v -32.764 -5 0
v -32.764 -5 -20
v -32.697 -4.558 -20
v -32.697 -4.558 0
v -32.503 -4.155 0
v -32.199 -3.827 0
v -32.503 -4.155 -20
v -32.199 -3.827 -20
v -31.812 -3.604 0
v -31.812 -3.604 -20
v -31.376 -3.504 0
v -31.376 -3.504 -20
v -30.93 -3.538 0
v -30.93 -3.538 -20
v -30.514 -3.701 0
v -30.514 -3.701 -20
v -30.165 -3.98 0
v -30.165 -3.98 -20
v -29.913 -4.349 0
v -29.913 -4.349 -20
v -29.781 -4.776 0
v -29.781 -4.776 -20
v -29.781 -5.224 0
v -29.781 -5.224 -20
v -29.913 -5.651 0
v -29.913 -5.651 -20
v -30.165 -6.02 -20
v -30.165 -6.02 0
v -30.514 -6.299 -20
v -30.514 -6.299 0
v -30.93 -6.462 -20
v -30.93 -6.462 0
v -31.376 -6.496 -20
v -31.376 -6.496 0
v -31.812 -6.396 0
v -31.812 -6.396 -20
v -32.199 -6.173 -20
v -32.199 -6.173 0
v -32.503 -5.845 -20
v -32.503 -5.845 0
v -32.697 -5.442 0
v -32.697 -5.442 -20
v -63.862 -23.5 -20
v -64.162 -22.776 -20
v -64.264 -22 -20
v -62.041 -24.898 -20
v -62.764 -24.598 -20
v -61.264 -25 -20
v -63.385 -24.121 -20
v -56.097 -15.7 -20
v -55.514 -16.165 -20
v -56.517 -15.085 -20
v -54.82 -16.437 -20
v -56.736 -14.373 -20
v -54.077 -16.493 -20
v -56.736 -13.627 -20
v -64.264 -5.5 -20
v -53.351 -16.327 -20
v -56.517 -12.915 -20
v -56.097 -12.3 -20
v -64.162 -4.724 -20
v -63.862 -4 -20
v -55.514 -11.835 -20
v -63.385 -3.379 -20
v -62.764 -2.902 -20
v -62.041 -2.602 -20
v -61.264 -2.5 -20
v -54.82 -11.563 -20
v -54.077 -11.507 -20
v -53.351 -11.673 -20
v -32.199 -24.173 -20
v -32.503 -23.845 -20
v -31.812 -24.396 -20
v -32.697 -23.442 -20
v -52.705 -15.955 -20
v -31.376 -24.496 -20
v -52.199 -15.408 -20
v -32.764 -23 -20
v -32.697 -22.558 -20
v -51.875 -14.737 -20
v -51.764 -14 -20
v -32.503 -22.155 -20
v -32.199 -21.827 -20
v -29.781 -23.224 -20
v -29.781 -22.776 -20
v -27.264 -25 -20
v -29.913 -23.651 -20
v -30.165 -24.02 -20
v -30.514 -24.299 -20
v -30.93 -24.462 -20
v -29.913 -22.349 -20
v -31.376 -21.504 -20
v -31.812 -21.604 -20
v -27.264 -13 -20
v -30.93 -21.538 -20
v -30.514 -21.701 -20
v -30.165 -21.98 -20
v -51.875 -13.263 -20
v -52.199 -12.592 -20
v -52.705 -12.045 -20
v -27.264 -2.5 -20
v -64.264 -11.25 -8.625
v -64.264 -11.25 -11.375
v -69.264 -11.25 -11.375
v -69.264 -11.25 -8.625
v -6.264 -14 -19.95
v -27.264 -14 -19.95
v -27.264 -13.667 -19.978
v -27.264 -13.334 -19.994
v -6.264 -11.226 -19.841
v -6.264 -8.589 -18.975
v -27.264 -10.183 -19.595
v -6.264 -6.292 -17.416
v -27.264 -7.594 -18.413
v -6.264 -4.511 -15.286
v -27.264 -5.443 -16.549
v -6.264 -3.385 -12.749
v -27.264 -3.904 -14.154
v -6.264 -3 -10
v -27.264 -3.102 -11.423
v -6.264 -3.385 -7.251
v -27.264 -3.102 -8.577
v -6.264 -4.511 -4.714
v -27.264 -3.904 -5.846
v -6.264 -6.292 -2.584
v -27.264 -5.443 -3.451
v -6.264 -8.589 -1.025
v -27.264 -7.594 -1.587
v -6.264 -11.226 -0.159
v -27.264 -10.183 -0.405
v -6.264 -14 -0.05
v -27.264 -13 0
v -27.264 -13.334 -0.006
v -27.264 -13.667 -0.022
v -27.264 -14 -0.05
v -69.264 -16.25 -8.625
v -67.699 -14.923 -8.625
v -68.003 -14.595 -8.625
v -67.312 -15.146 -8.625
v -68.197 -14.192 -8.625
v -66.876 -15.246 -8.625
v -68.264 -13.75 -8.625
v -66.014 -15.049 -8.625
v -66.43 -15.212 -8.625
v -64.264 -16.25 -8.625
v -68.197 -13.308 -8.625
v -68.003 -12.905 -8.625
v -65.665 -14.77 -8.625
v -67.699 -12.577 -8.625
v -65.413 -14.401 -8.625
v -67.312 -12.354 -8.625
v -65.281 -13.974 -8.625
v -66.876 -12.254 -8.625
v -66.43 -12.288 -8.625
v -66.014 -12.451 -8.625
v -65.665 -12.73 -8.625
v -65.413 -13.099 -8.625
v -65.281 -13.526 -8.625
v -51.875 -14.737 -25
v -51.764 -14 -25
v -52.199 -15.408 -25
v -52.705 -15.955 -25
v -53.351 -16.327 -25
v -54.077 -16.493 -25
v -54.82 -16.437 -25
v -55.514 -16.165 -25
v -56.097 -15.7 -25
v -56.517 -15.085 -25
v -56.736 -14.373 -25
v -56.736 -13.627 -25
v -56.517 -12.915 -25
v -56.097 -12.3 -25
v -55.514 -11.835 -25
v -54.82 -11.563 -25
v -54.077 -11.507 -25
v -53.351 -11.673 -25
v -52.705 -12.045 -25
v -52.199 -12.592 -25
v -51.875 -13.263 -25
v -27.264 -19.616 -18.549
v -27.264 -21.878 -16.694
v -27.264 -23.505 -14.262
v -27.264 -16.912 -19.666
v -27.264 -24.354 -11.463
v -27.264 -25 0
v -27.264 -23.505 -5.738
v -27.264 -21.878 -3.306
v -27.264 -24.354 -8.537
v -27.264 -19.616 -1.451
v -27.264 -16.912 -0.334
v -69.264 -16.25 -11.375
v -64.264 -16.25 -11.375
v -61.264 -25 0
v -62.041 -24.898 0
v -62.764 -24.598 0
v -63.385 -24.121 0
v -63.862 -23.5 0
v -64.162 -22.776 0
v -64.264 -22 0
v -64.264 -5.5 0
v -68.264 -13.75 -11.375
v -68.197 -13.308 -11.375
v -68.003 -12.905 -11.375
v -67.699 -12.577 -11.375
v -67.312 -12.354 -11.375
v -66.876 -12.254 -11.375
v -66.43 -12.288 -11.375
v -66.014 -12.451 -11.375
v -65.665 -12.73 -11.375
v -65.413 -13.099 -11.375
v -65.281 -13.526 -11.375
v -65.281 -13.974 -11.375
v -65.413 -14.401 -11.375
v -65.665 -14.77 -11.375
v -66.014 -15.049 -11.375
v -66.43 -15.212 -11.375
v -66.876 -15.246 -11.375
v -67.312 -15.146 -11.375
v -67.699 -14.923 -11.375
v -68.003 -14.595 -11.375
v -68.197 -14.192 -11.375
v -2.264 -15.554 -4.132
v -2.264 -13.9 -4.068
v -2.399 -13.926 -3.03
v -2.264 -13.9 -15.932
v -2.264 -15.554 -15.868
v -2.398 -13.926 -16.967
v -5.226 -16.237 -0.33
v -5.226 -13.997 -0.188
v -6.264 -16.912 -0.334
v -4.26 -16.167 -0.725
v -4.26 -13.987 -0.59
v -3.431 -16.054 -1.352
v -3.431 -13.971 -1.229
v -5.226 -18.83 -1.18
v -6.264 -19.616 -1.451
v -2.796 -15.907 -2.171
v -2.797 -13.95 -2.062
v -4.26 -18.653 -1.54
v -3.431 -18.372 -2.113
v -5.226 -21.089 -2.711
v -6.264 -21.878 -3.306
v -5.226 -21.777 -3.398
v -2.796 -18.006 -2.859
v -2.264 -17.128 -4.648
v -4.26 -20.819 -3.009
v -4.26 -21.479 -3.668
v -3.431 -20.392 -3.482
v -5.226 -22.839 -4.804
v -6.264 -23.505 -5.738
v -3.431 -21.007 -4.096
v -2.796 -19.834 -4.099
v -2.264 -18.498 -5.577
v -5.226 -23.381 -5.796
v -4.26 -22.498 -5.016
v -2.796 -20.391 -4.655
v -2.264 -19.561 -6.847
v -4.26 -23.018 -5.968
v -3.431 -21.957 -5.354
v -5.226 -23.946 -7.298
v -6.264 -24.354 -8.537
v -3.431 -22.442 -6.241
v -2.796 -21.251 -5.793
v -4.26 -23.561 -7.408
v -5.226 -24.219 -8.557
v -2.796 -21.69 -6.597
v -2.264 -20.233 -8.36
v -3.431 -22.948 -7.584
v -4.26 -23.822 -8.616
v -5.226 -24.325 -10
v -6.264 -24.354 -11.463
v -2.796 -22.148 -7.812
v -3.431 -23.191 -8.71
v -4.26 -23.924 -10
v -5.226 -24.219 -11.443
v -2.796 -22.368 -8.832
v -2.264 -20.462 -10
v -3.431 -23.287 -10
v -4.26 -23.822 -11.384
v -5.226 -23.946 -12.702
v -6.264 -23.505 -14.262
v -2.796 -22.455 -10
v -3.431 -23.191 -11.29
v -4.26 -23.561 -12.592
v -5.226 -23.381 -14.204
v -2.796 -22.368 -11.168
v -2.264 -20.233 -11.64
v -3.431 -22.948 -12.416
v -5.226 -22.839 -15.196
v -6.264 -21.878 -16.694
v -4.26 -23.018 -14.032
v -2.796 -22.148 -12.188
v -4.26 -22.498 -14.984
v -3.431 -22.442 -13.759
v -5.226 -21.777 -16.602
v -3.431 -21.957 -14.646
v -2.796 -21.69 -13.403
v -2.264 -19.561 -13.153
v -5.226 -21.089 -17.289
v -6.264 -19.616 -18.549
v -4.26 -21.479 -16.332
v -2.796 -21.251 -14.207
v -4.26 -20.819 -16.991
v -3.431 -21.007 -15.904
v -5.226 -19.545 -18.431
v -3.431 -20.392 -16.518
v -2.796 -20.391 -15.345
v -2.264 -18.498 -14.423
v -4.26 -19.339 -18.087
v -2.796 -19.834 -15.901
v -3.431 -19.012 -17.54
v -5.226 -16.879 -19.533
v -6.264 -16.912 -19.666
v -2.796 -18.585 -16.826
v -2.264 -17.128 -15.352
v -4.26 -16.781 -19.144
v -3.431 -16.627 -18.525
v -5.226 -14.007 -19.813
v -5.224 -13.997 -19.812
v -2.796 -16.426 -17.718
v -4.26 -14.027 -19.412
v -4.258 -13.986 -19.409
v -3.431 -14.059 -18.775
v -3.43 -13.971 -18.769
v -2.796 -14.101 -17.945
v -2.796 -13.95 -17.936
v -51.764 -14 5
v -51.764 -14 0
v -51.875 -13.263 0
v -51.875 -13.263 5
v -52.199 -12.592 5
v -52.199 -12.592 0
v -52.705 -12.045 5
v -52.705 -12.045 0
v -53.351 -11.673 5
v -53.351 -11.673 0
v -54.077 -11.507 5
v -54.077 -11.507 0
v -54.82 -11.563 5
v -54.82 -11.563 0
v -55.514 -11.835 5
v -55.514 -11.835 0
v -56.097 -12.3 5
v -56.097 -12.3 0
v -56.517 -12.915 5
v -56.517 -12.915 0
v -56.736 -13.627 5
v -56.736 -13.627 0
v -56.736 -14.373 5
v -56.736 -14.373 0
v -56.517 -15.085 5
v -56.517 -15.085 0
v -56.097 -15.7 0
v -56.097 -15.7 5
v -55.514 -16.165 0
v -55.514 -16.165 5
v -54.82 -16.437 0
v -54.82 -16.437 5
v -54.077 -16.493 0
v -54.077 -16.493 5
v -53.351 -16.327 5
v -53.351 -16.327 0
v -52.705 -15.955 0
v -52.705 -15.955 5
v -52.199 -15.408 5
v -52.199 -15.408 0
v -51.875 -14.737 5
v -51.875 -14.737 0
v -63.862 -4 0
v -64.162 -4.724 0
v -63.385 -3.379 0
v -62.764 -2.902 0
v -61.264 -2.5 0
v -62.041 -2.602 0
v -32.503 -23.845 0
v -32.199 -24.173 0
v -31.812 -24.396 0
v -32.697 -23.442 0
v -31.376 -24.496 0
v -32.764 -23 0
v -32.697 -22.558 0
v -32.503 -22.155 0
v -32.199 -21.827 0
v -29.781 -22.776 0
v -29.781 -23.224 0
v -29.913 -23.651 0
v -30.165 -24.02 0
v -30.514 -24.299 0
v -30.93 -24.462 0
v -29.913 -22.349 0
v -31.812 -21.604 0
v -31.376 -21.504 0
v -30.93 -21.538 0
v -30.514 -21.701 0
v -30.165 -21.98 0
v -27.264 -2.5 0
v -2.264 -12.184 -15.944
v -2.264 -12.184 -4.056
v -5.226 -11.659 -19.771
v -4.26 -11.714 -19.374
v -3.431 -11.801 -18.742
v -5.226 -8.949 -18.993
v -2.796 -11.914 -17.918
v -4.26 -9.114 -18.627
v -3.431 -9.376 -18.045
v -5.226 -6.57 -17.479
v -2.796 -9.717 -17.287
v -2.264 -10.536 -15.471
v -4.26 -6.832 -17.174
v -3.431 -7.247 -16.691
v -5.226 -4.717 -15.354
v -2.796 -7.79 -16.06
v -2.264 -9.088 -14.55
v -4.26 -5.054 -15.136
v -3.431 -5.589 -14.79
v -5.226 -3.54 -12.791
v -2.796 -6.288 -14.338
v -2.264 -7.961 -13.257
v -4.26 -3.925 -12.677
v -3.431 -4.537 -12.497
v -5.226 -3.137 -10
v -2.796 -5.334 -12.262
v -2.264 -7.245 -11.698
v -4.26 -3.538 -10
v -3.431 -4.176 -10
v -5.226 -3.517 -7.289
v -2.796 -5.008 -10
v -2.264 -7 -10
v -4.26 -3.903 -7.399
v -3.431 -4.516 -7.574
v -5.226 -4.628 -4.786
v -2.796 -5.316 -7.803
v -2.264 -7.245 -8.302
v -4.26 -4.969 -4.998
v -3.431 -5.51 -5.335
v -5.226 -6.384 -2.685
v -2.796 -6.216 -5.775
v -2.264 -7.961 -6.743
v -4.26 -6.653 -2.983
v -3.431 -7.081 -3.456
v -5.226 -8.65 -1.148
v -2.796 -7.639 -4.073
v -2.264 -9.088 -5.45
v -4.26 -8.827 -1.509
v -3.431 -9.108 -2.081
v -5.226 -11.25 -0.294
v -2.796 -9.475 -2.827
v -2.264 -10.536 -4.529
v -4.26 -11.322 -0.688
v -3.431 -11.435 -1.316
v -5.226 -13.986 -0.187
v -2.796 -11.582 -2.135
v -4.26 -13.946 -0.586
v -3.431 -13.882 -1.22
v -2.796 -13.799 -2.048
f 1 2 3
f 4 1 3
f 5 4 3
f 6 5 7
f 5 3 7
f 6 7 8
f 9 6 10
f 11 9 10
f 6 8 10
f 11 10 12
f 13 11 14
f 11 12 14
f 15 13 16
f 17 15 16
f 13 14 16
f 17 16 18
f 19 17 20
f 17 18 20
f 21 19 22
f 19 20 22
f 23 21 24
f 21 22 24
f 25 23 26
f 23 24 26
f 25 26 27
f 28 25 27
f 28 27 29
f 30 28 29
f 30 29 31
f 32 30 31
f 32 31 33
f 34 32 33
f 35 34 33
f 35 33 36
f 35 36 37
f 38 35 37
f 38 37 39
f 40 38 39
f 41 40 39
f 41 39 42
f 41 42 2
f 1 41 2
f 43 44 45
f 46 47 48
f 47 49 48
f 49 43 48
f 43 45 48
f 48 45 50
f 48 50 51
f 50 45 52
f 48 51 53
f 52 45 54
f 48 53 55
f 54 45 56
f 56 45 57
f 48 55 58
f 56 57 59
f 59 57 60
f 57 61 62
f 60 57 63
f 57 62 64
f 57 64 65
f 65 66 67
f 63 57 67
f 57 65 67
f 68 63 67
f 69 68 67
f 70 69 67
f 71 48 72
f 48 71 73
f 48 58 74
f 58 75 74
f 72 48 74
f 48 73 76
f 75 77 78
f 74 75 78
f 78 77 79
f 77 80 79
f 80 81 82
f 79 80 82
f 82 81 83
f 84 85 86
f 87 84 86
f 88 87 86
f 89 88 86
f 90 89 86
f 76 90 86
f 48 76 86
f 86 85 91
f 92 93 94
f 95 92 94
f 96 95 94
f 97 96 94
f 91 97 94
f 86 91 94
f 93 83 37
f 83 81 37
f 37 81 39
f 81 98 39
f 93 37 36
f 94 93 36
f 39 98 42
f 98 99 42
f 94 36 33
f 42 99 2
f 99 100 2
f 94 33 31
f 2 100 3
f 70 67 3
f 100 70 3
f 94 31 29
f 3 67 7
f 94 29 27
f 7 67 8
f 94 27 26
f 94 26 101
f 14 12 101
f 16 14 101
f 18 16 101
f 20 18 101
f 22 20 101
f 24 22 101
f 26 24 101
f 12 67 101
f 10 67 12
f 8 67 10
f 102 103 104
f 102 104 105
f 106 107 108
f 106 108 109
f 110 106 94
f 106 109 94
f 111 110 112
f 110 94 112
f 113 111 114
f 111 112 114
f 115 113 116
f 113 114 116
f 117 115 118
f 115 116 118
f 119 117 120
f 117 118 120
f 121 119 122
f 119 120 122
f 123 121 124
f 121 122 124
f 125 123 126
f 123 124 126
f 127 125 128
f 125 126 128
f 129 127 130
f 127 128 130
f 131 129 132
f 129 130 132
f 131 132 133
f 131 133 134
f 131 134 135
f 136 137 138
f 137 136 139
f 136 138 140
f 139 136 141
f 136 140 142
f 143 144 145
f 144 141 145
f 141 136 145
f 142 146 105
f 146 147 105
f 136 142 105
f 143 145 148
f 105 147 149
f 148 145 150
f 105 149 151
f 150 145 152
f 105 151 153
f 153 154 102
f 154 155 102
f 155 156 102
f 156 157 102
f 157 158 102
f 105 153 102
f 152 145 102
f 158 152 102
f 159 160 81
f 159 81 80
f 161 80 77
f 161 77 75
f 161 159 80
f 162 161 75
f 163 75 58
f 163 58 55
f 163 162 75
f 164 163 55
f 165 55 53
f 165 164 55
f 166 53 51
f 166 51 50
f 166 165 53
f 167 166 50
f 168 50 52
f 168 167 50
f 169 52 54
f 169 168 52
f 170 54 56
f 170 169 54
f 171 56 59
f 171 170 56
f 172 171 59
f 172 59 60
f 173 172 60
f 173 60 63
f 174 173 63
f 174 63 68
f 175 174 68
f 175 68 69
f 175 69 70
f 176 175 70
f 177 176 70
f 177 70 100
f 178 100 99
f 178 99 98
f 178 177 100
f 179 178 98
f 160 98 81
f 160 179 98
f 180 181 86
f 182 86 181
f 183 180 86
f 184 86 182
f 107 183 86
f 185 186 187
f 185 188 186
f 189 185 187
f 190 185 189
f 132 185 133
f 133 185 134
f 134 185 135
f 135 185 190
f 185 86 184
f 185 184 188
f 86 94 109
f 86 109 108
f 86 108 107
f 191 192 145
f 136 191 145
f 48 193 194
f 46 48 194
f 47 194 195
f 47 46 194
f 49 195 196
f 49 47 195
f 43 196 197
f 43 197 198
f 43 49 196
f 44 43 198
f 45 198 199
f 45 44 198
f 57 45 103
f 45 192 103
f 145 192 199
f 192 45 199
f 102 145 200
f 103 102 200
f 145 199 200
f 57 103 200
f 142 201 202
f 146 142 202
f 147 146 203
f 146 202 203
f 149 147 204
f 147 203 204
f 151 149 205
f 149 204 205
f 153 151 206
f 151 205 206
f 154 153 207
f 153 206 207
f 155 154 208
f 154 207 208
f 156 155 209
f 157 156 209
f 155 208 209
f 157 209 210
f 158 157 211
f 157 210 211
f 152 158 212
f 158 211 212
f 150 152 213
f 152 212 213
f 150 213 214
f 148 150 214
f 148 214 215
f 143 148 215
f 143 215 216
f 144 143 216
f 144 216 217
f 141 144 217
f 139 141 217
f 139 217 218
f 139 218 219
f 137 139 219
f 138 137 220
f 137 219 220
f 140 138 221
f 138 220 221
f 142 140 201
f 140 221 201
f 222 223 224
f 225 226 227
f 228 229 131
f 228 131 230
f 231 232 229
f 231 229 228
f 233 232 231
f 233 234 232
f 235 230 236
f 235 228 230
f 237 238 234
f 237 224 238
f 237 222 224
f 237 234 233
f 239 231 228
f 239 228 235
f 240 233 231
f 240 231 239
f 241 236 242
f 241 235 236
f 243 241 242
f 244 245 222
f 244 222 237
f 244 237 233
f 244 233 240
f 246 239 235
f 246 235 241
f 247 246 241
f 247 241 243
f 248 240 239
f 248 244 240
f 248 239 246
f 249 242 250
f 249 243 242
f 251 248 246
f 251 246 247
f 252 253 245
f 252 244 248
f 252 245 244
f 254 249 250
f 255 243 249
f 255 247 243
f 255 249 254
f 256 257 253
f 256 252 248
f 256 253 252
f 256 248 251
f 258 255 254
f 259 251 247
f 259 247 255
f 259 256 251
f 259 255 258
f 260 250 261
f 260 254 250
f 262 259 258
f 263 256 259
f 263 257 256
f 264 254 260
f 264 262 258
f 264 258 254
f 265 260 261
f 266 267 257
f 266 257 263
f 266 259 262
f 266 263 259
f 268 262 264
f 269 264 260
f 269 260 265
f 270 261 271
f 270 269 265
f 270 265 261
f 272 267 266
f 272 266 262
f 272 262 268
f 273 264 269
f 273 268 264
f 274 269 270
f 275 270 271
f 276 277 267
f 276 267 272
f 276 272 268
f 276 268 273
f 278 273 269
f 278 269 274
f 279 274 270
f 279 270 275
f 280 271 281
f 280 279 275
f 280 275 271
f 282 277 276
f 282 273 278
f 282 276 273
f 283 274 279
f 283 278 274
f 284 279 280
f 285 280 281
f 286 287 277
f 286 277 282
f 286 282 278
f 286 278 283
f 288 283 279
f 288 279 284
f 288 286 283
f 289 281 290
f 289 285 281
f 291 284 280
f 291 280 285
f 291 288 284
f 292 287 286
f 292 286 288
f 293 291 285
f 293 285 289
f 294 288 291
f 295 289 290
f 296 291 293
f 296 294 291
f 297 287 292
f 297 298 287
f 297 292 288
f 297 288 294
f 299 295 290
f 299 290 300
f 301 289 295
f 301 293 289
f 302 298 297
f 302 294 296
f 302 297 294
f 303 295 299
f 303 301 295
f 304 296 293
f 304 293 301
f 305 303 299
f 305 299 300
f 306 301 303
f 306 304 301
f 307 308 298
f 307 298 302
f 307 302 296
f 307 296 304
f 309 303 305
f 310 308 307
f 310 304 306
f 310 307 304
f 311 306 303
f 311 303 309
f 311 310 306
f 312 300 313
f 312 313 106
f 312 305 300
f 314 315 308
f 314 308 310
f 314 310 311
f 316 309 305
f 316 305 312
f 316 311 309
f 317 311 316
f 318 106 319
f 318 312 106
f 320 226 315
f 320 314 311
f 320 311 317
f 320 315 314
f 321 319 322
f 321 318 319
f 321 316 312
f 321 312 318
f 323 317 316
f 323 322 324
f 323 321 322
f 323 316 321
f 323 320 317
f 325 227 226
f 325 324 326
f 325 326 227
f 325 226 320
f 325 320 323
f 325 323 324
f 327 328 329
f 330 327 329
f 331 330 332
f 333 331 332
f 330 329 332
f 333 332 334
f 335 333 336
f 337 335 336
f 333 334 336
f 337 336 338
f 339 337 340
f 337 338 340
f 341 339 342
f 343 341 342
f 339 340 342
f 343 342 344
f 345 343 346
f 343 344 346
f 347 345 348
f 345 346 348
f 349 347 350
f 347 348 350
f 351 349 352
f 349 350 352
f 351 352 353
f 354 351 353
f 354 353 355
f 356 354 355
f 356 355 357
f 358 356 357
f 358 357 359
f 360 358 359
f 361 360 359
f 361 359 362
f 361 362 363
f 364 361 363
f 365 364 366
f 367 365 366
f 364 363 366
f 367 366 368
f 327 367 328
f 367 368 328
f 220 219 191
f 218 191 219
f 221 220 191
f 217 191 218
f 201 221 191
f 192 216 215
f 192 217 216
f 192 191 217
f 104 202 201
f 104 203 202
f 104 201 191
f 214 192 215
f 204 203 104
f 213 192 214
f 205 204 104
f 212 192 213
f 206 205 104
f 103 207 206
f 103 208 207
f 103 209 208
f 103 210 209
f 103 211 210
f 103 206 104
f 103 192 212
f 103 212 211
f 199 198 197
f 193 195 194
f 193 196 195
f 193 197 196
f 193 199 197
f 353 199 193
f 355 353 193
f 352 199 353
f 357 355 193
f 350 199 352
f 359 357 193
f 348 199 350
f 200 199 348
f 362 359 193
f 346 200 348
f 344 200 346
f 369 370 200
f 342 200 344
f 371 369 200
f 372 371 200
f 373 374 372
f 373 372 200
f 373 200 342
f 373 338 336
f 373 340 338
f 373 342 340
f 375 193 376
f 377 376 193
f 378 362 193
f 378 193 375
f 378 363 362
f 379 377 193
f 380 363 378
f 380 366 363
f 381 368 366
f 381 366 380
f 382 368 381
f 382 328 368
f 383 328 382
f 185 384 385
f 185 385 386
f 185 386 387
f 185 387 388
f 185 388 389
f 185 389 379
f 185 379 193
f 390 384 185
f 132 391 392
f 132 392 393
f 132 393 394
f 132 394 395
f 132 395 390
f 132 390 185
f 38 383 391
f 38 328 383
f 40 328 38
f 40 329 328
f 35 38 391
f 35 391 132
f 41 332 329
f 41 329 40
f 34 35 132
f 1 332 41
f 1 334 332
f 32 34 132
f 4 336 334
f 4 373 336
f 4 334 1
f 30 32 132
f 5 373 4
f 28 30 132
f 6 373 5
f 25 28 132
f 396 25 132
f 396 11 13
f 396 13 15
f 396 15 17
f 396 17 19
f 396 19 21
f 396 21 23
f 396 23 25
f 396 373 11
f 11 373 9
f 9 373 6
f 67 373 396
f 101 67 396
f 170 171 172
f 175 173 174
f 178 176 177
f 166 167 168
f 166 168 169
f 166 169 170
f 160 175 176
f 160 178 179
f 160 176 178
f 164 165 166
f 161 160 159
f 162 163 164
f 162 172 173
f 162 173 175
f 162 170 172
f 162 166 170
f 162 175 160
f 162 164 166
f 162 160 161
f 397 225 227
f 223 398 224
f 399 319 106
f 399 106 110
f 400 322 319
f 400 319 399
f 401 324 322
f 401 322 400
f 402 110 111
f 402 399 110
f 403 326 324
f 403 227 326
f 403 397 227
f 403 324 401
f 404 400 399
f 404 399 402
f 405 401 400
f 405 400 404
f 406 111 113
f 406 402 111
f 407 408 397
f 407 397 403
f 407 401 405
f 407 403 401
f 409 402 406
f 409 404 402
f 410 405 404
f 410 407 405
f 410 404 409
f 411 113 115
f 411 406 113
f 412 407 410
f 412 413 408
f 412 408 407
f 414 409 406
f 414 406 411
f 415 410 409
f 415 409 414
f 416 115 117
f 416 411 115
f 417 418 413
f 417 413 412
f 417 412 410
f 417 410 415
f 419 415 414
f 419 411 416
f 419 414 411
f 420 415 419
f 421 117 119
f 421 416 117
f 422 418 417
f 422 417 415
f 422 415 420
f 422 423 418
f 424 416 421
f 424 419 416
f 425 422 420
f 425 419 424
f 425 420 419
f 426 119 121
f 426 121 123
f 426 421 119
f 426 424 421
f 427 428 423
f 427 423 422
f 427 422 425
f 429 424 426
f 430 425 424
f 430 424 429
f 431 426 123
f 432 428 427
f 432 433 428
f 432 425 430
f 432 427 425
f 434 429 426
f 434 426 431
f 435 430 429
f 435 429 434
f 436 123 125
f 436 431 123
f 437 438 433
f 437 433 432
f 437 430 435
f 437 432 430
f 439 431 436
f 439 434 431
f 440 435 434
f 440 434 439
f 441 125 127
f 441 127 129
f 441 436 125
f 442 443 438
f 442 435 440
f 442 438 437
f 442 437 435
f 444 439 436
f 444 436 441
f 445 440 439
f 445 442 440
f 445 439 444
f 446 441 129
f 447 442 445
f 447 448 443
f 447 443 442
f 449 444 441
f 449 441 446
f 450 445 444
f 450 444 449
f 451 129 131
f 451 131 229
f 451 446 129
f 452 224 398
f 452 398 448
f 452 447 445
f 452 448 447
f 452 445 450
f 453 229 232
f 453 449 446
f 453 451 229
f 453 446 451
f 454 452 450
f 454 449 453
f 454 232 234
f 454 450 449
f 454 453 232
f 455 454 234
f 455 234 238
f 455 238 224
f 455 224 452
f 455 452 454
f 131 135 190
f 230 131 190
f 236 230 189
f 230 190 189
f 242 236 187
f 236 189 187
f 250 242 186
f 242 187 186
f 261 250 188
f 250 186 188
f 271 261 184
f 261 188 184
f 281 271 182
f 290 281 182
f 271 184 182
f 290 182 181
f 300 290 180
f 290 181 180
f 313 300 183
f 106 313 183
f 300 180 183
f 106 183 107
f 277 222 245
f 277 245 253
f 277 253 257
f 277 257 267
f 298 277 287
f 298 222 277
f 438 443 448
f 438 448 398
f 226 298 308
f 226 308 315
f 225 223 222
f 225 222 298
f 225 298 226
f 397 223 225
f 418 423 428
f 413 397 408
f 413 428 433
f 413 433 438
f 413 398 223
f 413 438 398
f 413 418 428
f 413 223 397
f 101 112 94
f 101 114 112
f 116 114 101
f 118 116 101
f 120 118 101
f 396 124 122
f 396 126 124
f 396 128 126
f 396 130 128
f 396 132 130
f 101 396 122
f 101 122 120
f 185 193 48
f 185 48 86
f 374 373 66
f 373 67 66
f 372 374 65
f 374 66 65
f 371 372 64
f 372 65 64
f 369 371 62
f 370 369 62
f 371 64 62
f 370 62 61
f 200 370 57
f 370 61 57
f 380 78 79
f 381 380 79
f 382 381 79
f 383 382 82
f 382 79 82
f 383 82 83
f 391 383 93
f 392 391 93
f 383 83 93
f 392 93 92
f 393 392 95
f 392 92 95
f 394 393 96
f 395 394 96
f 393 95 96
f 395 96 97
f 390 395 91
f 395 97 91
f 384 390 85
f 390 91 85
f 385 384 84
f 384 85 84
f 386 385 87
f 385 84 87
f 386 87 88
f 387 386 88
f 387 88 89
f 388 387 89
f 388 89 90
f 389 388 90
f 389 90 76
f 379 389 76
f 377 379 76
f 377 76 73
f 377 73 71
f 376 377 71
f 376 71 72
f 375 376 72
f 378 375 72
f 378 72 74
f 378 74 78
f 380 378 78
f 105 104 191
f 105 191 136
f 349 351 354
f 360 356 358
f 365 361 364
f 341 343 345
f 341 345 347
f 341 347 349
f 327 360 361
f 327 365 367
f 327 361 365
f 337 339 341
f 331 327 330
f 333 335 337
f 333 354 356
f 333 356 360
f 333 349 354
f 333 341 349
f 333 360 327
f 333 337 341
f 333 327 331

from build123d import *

# Parameters (mm, degrees)
SKETCH1_W           = 37
SKETCH1_H           = 22.5
BOSS_EXTRUDE1_DEPTH = 20
BOSS_EXTRUDE2_DEPTH = 25
SKETCH3_R           = 2.5
BOSS_EXTRUDE3_DEPTH = 5
BOSS_EXTRUDE4_START = 5
SKETCH4_R           = 2.5
BOSS_EXTRUDE4_DEPTH = 5
FILLET1_R           = 3
FILLET2_R           = 4
SKETCH5_W           = 2.75
SKETCH5_H           = 5
BOSS_EXTRUDE5_DEPTH = 5
SKETCH6_R           = 1.5
CUT_EXTRUDE1_DEPTH  = 2.75
SKETCH7_R           = 1.5
CUT_EXTRUDE2_DEPTH  = 78.76577433


with BuildPart() as part:
    # Sketch1 → Boss-Extrude1 (new body)
    with BuildSketch(Plane.XY):
        with Locations((-45.764100782, -13.75)):
            Rectangle(SKETCH1_W, SKETCH1_H)
    extrude(amount=-BOSS_EXTRUDE1_DEPTH)

    # Sketch2 → Boss-Extrude2 (add)
    with BuildSketch(Plane(origin=(-27.264100782, 0, 0), x_dir=(0, 0, -1), z_dir=(1, 0, 0))):
        with BuildLine():
            ThreePointArc((0.050125629, -14), (10, -24.462429423), (19.949874371, -14))
            ThreePointArc((19.949874371, -14), (10, -3), (0.050125629, -14))
        make_face()
    extrude(amount=BOSS_EXTRUDE2_DEPTH)

    # Sketch3 → Boss-Extrude3 (add)
    with BuildSketch(Plane.XY):
        with Locations((-54.264100782, -14)):
            Circle(SKETCH3_R)
    extrude(amount=BOSS_EXTRUDE3_DEPTH)

    # Sketch4 → Boss-Extrude4 (add)
    with BuildSketch(Plane(origin=(0, 0, -20), x_dir=(-1, 0, 0), z_dir=(0, 0, -1)).offset(BOSS_EXTRUDE4_START)):
        with Locations(Location((54.264100782, -14, 0), (0, 0, 180))):
            Circle(SKETCH4_R)
    extrude(amount=-BOSS_EXTRUDE4_DEPTH)

    # Fillet1
    fillet1_edges = [part.edges().sort_by_distance(p)[0] for p in [
        (-64.264100782, -2.5, -10),
        (-64.264100782, -25, -10),
    ]]
    fillet(fillet1_edges, radius=FILLET1_R)

    # Fillet2
    fillet2_edges = [part.edges().sort_by_distance(p)[0] for p in [
        (-2.264100782, -3, -10),
        (-2.264100782, -24.462429423, -10),
    ]]
    fillet(fillet2_edges, radius=FILLET2_R)

    # Sketch5 → Boss-Extrude5 (add)
    with BuildSketch(Plane.ZY.offset(64.264100782)):
        with Locations((-10, -13.75)):
            Rectangle(SKETCH5_W, SKETCH5_H)
    extrude(amount=BOSS_EXTRUDE5_DEPTH)

    # Sketch6 → Cut-Extrude1 (cut)
    with BuildSketch(Plane(origin=(0, 0, -11.375), x_dir=(-1, 0, 0), z_dir=(0, 0, -1))):
        with Locations((66.764100782, -13.75)):
            Circle(SKETCH6_R)
    extrude(amount=-CUT_EXTRUDE1_DEPTH, mode=Mode.SUBTRACT)

    # Sketch7 → Cut-Extrude2 (cut, through all)
    with BuildSketch(Plane(origin=(0, 0, -20), x_dir=(-1, 0, 0), z_dir=(0, 0, -1))):
        with Locations((31.264100782, -5)):
            Circle(SKETCH7_R)
        with Locations((31.264100782, -23)):
            Circle(SKETCH7_R)
    extrude(amount=-CUT_EXTRUDE2_DEPTH, mode=Mode.SUBTRACT)


solid = part.part
